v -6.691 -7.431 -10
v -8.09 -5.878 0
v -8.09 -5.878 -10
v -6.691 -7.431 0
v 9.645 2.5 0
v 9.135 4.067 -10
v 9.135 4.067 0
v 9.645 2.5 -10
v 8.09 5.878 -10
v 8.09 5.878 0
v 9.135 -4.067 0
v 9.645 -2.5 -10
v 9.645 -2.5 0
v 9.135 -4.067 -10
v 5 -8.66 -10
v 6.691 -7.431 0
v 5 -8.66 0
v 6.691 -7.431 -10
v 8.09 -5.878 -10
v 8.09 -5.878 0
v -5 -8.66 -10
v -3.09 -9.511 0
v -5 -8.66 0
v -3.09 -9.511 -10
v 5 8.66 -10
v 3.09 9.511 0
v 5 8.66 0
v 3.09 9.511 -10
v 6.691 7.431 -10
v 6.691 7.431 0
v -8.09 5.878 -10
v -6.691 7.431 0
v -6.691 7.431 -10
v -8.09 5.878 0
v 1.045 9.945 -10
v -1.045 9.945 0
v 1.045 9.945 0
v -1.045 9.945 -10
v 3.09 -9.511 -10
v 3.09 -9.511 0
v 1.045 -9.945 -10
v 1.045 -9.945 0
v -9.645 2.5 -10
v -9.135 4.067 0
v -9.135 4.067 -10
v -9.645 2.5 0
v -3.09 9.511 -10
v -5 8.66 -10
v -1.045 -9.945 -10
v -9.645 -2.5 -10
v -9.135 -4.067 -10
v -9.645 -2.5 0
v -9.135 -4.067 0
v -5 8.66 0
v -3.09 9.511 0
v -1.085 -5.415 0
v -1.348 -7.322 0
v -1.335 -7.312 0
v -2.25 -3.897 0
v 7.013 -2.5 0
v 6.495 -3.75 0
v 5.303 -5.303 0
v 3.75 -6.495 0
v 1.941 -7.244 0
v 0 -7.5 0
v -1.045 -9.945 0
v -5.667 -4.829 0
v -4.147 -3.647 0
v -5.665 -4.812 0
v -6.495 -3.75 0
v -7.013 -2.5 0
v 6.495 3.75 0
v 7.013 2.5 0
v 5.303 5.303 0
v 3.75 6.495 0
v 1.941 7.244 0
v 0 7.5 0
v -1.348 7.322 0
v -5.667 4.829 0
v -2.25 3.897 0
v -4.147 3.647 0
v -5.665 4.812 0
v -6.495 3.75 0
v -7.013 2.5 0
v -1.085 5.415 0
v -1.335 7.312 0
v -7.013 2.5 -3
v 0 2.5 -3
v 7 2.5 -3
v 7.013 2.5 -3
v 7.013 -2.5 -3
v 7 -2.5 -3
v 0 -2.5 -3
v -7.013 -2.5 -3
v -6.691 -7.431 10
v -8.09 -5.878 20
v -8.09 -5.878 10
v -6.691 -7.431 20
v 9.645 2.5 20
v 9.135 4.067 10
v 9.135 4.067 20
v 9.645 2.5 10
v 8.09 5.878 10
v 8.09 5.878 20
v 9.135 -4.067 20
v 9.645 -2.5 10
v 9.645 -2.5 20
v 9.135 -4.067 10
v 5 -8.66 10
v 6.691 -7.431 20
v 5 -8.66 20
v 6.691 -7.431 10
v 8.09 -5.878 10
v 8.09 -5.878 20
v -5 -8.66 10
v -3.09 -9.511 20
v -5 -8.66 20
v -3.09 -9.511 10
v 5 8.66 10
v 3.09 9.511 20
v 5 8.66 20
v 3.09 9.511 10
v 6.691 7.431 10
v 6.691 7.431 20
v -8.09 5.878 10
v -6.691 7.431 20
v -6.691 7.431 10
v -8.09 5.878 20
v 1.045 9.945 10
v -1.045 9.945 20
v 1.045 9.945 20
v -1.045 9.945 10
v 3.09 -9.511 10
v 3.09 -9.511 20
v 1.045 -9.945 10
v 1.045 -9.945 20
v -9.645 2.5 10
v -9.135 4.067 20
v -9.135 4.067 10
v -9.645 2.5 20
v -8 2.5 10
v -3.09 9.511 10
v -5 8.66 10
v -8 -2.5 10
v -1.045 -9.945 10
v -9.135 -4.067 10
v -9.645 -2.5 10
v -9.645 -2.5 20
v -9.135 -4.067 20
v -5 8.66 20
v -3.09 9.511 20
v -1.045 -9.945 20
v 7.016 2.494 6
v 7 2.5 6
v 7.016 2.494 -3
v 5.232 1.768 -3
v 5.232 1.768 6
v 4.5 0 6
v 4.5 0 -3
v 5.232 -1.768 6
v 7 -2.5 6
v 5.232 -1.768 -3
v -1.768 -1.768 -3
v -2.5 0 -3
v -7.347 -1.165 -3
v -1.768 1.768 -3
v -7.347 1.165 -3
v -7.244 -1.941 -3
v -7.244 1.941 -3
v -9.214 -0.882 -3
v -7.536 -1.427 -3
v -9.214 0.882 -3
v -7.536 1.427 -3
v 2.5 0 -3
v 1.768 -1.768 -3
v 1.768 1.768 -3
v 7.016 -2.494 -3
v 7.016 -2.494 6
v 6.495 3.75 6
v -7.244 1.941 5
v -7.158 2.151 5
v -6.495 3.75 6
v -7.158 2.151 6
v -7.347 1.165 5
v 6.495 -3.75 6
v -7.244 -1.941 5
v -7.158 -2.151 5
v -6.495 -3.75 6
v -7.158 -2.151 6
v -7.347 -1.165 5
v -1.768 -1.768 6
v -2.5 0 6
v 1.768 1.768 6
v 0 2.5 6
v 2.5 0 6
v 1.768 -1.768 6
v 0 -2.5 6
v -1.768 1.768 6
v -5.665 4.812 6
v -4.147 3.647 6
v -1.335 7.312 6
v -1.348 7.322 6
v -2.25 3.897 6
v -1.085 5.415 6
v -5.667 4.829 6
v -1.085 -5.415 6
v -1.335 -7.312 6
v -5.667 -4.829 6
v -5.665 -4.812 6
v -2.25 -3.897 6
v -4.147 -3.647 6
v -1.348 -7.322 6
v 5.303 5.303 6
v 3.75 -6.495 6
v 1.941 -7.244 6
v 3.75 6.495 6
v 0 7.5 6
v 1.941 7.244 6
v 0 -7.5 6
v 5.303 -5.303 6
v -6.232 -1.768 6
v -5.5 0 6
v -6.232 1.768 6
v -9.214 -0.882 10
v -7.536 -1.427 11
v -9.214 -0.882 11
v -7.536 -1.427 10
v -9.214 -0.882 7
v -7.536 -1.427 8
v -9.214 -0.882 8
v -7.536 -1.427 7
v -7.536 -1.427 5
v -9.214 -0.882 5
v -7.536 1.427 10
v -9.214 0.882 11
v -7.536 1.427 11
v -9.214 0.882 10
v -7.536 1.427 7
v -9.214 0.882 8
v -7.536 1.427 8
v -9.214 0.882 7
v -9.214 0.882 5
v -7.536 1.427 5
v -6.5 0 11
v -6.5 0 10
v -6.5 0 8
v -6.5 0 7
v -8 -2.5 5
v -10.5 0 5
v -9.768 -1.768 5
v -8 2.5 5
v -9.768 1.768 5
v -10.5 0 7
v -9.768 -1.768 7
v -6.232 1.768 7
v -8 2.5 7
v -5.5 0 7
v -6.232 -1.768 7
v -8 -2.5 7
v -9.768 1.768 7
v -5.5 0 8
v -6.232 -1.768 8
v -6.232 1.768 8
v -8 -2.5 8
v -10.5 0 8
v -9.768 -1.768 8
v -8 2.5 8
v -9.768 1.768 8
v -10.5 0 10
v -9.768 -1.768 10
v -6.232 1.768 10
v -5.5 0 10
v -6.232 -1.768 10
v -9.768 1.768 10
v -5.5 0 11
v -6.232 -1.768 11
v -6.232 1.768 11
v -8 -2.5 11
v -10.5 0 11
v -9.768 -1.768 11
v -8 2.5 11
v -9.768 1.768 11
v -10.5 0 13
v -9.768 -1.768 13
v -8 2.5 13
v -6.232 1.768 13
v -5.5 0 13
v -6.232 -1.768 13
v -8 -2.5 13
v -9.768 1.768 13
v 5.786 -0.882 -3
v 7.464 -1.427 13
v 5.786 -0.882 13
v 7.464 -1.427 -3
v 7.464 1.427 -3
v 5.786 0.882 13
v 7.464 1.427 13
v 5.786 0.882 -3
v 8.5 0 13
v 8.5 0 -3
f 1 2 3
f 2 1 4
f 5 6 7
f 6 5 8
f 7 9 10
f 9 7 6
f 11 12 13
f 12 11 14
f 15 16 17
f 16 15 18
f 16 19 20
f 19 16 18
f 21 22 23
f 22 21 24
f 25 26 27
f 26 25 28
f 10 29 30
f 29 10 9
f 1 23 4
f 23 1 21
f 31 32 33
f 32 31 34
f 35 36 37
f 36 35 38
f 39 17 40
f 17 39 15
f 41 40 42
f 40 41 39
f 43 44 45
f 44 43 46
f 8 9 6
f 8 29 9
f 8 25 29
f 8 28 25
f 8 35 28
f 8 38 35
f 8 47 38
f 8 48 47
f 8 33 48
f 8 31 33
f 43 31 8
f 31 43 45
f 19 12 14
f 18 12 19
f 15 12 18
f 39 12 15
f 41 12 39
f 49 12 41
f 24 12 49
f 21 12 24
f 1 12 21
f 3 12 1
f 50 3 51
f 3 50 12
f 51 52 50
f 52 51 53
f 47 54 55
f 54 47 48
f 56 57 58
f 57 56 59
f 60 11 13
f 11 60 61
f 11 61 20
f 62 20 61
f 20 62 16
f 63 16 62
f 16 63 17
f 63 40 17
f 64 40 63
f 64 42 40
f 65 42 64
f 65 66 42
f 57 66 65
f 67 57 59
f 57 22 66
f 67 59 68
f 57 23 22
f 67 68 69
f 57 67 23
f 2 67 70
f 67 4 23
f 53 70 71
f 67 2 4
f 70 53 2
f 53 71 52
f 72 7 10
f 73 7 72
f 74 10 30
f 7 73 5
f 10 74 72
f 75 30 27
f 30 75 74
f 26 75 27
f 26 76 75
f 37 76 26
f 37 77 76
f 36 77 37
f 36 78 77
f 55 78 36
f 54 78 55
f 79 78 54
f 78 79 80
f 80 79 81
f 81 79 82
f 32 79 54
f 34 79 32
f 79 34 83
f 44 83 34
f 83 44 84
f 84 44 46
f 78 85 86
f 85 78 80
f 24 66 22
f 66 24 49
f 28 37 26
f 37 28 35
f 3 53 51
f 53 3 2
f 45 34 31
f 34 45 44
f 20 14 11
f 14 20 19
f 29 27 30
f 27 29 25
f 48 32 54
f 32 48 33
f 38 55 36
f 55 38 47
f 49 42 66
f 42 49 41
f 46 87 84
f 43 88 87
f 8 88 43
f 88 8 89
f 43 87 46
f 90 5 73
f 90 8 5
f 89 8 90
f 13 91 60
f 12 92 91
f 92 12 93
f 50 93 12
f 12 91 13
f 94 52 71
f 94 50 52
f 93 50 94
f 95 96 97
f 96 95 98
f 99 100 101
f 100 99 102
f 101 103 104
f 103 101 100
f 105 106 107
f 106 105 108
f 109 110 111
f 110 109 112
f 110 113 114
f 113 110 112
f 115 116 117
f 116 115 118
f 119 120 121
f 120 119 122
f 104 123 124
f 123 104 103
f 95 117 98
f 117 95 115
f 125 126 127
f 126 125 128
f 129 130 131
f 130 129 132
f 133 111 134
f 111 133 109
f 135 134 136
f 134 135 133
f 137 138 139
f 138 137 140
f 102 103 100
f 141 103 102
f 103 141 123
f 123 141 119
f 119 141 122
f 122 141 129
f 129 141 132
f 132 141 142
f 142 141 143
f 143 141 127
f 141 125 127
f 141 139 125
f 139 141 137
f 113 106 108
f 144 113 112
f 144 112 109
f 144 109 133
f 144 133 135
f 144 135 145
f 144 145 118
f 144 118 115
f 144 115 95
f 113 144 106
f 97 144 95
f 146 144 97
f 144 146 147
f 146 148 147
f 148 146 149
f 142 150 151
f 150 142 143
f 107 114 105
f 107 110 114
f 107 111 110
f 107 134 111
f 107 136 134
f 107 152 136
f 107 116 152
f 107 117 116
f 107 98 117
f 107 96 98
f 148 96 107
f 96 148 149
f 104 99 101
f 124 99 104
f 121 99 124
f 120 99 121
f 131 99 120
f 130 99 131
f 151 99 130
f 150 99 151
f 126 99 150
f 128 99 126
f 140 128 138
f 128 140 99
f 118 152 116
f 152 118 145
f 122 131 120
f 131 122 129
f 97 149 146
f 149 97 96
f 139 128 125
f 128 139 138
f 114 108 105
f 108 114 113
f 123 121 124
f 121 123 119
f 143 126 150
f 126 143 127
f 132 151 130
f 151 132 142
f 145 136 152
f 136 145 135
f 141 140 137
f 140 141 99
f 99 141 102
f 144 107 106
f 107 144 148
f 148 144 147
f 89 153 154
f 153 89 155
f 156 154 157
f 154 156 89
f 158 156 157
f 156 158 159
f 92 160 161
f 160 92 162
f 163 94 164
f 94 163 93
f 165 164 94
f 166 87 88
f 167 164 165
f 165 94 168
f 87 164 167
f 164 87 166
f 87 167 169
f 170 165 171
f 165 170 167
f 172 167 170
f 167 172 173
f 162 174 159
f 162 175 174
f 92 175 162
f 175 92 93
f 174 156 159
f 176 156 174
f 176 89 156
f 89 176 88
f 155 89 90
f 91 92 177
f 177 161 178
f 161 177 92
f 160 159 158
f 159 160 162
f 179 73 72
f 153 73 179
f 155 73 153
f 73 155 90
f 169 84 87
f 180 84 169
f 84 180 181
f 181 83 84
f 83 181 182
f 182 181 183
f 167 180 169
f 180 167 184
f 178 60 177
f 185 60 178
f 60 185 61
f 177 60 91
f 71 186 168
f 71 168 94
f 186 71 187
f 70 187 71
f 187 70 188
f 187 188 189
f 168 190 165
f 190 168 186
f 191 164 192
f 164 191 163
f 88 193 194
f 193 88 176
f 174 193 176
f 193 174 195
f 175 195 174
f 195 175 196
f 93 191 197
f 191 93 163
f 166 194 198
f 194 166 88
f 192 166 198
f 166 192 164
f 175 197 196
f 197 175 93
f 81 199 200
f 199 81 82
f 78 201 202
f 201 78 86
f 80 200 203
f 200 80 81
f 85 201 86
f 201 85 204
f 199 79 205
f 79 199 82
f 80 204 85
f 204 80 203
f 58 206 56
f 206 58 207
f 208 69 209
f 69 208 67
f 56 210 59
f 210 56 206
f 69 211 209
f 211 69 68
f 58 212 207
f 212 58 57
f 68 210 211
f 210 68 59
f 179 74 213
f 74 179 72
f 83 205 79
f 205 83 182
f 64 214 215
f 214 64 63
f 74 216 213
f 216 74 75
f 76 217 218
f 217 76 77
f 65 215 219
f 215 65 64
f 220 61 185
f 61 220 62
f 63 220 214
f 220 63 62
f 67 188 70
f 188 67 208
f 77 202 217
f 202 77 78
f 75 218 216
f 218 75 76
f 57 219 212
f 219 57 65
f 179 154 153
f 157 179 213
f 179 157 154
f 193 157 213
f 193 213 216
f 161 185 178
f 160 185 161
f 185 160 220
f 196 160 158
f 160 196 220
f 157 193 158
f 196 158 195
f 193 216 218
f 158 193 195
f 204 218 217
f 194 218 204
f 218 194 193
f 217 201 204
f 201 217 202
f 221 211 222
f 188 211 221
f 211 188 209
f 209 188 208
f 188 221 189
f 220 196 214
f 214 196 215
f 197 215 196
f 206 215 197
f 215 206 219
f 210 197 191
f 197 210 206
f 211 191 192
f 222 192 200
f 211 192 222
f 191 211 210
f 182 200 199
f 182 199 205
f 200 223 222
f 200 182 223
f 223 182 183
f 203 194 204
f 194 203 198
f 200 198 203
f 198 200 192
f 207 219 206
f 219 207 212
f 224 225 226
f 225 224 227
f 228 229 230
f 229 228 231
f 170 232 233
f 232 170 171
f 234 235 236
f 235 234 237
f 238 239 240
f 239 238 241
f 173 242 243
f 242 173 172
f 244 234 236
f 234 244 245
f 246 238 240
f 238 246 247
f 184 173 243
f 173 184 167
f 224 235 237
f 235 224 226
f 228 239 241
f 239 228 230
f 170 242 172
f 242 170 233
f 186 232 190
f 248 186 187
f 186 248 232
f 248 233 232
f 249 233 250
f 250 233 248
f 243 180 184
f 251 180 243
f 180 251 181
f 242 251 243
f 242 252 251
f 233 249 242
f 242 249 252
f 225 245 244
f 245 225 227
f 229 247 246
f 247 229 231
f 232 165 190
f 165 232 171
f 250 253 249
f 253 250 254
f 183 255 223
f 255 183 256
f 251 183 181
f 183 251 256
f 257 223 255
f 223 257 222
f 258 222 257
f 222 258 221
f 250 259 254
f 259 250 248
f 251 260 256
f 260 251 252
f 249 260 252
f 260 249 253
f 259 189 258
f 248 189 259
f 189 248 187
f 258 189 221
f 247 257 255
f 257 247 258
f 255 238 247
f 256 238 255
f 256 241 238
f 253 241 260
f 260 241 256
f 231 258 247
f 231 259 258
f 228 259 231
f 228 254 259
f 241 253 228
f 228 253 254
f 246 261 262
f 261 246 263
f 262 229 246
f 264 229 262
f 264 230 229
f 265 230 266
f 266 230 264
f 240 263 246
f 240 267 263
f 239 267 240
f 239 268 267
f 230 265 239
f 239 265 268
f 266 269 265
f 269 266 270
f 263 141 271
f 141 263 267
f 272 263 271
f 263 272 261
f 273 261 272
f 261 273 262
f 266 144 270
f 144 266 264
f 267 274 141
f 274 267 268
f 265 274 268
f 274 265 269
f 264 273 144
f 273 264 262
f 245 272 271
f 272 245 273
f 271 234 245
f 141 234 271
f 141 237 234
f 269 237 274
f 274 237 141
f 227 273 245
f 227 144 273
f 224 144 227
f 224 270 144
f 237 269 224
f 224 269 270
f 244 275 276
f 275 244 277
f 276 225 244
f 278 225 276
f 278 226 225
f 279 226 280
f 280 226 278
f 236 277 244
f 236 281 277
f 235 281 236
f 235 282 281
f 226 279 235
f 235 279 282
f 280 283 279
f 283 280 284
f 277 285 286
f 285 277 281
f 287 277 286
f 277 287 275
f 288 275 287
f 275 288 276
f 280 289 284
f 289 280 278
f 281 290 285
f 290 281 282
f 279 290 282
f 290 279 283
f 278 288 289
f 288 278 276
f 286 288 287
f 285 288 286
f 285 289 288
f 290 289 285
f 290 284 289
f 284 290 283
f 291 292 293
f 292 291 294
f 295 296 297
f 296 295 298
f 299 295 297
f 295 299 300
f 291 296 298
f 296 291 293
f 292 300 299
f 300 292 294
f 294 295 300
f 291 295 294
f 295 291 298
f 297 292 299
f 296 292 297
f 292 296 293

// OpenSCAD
// Clamp Hub Module with refined shape and fastener cutouts
module clamp_hub() {
    difference() {
        cylinder(h=10, d=20);
        translate([0,0,-1]) cylinder(h=12, d=5); // Shaft hole
        translate([0,0,5]) cube([20, 5, 10], center=true); // Clamp cut
        
        // Adding fastener holes
        translate([8, 0, 5]) rotate([0,90,0]) cylinder(h=10, d=3);
        translate([-8, 0, 5]) rotate([0,90,0]) cylinder(h=10, d=3);
    }
}

// Flexible Element Module with curved cutouts for flexibility
module flexible_element() {
    difference() {
        cylinder(h=3, d=15);
        translate([0,0,-1]) cylinder(h=5, d=5); // Central hole
        
        // Adding curved cutouts for flexibility
        for (i = [0:120:360]) {
            rotate([0,0,i]) translate([7,0,0]) cylinder(h=3, d=5);
        }
    }
}

// Spacer Pin Module with proper cylindrical shape
module spacer_pin() {
    cylinder(h=10, d=3);
}

// Fastener Screw Module with correct screw head shape
module fastener_screw() {
    union() {
        cylinder(h=8, d=3);
        translate([0,0,8]) cylinder(h=2, d=5);
    }
}

// Assemble the coupling with correct positioning
module flexible_coupling() {
    translate([0, 0, -10]) clamp_hub();
    translate([0, 0, 10]) clamp_hub();
    
    translate([0, 0, -3]) flexible_element();
    translate([0, 0, 0]) flexible_element();
    translate([0, 0, 3]) flexible_element();
    
    translate([7, 0, -3]) spacer_pin();
    translate([7, 0, 0]) spacer_pin();
    translate([7, 0, 3]) spacer_pin();
    
    translate([-8, 0, -3]) fastener_screw();
    translate([-8, 0, 0]) fastener_screw();
    translate([-8, 0, 3]) fastener_screw();
}

// Render the model
flexible_coupling();
